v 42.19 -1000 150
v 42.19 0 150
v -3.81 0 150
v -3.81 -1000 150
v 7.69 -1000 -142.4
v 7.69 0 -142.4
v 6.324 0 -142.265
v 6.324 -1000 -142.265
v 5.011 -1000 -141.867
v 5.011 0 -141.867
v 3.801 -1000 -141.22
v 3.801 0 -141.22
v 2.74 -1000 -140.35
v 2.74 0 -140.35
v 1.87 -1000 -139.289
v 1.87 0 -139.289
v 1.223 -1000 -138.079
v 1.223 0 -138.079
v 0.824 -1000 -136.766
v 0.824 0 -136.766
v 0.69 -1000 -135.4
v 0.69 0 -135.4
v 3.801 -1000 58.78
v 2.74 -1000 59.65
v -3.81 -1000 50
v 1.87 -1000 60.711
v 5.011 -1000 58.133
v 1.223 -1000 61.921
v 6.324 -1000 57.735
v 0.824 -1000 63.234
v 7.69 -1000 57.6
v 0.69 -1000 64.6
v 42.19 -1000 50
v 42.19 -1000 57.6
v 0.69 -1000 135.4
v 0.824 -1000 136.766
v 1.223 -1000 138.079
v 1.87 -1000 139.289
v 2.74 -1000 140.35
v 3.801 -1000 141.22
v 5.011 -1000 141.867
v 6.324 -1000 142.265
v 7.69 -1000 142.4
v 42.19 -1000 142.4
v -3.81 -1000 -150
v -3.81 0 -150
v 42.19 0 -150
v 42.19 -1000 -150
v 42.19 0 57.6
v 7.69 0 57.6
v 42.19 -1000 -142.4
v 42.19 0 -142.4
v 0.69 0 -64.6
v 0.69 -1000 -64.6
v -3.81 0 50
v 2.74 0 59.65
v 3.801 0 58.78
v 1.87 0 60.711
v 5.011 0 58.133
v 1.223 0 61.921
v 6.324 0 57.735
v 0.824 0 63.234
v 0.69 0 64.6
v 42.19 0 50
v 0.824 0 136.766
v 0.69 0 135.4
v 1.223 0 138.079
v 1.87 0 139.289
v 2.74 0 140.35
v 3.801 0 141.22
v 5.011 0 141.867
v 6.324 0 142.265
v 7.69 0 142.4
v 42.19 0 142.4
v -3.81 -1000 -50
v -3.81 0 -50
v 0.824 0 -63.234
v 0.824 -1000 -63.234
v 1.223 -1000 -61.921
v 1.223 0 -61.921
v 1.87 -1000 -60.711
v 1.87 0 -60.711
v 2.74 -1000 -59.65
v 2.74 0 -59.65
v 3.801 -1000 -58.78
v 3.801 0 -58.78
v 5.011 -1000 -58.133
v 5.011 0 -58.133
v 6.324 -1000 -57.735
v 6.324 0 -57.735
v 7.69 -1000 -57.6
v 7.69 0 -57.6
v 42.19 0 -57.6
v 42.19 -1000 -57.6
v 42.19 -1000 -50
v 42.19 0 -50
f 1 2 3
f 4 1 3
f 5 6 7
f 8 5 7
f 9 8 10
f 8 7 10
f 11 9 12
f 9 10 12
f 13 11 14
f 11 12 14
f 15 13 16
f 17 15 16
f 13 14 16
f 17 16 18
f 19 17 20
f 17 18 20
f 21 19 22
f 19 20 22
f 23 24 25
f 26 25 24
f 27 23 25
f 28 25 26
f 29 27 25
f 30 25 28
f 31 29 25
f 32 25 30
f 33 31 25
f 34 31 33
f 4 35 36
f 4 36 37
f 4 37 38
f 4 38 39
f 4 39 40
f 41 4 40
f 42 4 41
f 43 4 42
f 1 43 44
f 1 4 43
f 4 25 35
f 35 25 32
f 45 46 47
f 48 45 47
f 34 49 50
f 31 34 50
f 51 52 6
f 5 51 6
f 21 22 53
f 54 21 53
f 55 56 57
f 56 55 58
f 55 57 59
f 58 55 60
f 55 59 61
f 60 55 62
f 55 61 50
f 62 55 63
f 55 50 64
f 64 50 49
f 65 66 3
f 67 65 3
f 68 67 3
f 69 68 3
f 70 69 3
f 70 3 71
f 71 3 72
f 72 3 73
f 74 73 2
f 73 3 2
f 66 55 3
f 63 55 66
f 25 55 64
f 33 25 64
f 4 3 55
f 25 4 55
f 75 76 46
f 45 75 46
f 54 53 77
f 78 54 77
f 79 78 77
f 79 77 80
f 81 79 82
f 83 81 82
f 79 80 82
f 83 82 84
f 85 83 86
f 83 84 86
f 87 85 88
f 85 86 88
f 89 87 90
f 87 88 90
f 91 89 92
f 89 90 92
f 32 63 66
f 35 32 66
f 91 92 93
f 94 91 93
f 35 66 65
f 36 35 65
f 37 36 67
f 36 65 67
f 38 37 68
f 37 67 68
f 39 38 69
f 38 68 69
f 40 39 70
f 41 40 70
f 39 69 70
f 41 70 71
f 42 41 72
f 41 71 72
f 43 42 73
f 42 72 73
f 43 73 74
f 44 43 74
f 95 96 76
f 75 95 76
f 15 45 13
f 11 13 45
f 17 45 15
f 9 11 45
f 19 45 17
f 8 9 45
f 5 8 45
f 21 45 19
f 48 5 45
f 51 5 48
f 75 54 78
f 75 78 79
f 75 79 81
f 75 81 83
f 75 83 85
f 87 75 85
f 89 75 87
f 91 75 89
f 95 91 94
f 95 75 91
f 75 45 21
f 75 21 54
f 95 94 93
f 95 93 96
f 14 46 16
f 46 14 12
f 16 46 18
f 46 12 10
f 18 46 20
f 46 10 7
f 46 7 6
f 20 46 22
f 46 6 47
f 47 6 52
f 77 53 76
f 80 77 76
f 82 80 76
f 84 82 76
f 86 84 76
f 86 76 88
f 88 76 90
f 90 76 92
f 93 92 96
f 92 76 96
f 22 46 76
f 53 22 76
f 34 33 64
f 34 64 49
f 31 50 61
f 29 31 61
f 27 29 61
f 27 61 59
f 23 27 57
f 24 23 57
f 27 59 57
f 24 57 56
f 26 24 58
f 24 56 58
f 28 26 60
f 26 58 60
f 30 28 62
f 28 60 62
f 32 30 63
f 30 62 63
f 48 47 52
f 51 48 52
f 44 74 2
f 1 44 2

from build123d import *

# Parameters (mm, degrees)
F1_DEPTH = 1000


with BuildPart() as f1:
    # F0 (on Front) → F1 (new body)
    with BuildSketch(Plane.XZ):
        with BuildLine():
            Line((42.189906, -50), (-3.810094, -50))
            Line((-3.810094, -50), (-3.810094, -150))
            Line((-3.810094, -150), (42.189906, -150))
            Line((42.189906, -150), (42.189906, -142.4))
            Line((42.189906, -142.4), (7.689906, -142.4))
            ThreePointArc((7.689906, -142.4), (2.740159, -140.349747), (0.689906, -135.4))
            Line((0.689906, -135.4), (0.689906, -64.6))
            ThreePointArc((0.689906, -64.6), (2.740159, -59.650253), (7.689906, -57.6))
            Line((7.689906, -57.6), (42.189906, -57.6))
            Line((42.189906, -57.6), (42.189906, -50))
        make_face()
        with BuildLine():
            Line((0.689906, 64.6), (0.689906, 135.4))
            ThreePointArc((0.689906, 135.4), (2.740159, 140.349747), (7.689906, 142.4))
            Line((7.689906, 142.4), (42.189906, 142.4))
            Line((42.189906, 142.4), (42.189906, 150))
            Line((42.189906, 150), (-3.810094, 150))
            Line((-3.810094, 150), (-3.810094, 50))
            Line((-3.810094, 50), (42.189906, 50))
            Line((42.189906, 50), (42.189906, 57.6))
            Line((42.189906, 57.6), (7.689906, 57.6))
            ThreePointArc((7.689906, 57.6), (2.740159, 59.650253), (0.689906, 64.6))
        make_face()
    extrude(amount=F1_DEPTH)


solid = f1.part
